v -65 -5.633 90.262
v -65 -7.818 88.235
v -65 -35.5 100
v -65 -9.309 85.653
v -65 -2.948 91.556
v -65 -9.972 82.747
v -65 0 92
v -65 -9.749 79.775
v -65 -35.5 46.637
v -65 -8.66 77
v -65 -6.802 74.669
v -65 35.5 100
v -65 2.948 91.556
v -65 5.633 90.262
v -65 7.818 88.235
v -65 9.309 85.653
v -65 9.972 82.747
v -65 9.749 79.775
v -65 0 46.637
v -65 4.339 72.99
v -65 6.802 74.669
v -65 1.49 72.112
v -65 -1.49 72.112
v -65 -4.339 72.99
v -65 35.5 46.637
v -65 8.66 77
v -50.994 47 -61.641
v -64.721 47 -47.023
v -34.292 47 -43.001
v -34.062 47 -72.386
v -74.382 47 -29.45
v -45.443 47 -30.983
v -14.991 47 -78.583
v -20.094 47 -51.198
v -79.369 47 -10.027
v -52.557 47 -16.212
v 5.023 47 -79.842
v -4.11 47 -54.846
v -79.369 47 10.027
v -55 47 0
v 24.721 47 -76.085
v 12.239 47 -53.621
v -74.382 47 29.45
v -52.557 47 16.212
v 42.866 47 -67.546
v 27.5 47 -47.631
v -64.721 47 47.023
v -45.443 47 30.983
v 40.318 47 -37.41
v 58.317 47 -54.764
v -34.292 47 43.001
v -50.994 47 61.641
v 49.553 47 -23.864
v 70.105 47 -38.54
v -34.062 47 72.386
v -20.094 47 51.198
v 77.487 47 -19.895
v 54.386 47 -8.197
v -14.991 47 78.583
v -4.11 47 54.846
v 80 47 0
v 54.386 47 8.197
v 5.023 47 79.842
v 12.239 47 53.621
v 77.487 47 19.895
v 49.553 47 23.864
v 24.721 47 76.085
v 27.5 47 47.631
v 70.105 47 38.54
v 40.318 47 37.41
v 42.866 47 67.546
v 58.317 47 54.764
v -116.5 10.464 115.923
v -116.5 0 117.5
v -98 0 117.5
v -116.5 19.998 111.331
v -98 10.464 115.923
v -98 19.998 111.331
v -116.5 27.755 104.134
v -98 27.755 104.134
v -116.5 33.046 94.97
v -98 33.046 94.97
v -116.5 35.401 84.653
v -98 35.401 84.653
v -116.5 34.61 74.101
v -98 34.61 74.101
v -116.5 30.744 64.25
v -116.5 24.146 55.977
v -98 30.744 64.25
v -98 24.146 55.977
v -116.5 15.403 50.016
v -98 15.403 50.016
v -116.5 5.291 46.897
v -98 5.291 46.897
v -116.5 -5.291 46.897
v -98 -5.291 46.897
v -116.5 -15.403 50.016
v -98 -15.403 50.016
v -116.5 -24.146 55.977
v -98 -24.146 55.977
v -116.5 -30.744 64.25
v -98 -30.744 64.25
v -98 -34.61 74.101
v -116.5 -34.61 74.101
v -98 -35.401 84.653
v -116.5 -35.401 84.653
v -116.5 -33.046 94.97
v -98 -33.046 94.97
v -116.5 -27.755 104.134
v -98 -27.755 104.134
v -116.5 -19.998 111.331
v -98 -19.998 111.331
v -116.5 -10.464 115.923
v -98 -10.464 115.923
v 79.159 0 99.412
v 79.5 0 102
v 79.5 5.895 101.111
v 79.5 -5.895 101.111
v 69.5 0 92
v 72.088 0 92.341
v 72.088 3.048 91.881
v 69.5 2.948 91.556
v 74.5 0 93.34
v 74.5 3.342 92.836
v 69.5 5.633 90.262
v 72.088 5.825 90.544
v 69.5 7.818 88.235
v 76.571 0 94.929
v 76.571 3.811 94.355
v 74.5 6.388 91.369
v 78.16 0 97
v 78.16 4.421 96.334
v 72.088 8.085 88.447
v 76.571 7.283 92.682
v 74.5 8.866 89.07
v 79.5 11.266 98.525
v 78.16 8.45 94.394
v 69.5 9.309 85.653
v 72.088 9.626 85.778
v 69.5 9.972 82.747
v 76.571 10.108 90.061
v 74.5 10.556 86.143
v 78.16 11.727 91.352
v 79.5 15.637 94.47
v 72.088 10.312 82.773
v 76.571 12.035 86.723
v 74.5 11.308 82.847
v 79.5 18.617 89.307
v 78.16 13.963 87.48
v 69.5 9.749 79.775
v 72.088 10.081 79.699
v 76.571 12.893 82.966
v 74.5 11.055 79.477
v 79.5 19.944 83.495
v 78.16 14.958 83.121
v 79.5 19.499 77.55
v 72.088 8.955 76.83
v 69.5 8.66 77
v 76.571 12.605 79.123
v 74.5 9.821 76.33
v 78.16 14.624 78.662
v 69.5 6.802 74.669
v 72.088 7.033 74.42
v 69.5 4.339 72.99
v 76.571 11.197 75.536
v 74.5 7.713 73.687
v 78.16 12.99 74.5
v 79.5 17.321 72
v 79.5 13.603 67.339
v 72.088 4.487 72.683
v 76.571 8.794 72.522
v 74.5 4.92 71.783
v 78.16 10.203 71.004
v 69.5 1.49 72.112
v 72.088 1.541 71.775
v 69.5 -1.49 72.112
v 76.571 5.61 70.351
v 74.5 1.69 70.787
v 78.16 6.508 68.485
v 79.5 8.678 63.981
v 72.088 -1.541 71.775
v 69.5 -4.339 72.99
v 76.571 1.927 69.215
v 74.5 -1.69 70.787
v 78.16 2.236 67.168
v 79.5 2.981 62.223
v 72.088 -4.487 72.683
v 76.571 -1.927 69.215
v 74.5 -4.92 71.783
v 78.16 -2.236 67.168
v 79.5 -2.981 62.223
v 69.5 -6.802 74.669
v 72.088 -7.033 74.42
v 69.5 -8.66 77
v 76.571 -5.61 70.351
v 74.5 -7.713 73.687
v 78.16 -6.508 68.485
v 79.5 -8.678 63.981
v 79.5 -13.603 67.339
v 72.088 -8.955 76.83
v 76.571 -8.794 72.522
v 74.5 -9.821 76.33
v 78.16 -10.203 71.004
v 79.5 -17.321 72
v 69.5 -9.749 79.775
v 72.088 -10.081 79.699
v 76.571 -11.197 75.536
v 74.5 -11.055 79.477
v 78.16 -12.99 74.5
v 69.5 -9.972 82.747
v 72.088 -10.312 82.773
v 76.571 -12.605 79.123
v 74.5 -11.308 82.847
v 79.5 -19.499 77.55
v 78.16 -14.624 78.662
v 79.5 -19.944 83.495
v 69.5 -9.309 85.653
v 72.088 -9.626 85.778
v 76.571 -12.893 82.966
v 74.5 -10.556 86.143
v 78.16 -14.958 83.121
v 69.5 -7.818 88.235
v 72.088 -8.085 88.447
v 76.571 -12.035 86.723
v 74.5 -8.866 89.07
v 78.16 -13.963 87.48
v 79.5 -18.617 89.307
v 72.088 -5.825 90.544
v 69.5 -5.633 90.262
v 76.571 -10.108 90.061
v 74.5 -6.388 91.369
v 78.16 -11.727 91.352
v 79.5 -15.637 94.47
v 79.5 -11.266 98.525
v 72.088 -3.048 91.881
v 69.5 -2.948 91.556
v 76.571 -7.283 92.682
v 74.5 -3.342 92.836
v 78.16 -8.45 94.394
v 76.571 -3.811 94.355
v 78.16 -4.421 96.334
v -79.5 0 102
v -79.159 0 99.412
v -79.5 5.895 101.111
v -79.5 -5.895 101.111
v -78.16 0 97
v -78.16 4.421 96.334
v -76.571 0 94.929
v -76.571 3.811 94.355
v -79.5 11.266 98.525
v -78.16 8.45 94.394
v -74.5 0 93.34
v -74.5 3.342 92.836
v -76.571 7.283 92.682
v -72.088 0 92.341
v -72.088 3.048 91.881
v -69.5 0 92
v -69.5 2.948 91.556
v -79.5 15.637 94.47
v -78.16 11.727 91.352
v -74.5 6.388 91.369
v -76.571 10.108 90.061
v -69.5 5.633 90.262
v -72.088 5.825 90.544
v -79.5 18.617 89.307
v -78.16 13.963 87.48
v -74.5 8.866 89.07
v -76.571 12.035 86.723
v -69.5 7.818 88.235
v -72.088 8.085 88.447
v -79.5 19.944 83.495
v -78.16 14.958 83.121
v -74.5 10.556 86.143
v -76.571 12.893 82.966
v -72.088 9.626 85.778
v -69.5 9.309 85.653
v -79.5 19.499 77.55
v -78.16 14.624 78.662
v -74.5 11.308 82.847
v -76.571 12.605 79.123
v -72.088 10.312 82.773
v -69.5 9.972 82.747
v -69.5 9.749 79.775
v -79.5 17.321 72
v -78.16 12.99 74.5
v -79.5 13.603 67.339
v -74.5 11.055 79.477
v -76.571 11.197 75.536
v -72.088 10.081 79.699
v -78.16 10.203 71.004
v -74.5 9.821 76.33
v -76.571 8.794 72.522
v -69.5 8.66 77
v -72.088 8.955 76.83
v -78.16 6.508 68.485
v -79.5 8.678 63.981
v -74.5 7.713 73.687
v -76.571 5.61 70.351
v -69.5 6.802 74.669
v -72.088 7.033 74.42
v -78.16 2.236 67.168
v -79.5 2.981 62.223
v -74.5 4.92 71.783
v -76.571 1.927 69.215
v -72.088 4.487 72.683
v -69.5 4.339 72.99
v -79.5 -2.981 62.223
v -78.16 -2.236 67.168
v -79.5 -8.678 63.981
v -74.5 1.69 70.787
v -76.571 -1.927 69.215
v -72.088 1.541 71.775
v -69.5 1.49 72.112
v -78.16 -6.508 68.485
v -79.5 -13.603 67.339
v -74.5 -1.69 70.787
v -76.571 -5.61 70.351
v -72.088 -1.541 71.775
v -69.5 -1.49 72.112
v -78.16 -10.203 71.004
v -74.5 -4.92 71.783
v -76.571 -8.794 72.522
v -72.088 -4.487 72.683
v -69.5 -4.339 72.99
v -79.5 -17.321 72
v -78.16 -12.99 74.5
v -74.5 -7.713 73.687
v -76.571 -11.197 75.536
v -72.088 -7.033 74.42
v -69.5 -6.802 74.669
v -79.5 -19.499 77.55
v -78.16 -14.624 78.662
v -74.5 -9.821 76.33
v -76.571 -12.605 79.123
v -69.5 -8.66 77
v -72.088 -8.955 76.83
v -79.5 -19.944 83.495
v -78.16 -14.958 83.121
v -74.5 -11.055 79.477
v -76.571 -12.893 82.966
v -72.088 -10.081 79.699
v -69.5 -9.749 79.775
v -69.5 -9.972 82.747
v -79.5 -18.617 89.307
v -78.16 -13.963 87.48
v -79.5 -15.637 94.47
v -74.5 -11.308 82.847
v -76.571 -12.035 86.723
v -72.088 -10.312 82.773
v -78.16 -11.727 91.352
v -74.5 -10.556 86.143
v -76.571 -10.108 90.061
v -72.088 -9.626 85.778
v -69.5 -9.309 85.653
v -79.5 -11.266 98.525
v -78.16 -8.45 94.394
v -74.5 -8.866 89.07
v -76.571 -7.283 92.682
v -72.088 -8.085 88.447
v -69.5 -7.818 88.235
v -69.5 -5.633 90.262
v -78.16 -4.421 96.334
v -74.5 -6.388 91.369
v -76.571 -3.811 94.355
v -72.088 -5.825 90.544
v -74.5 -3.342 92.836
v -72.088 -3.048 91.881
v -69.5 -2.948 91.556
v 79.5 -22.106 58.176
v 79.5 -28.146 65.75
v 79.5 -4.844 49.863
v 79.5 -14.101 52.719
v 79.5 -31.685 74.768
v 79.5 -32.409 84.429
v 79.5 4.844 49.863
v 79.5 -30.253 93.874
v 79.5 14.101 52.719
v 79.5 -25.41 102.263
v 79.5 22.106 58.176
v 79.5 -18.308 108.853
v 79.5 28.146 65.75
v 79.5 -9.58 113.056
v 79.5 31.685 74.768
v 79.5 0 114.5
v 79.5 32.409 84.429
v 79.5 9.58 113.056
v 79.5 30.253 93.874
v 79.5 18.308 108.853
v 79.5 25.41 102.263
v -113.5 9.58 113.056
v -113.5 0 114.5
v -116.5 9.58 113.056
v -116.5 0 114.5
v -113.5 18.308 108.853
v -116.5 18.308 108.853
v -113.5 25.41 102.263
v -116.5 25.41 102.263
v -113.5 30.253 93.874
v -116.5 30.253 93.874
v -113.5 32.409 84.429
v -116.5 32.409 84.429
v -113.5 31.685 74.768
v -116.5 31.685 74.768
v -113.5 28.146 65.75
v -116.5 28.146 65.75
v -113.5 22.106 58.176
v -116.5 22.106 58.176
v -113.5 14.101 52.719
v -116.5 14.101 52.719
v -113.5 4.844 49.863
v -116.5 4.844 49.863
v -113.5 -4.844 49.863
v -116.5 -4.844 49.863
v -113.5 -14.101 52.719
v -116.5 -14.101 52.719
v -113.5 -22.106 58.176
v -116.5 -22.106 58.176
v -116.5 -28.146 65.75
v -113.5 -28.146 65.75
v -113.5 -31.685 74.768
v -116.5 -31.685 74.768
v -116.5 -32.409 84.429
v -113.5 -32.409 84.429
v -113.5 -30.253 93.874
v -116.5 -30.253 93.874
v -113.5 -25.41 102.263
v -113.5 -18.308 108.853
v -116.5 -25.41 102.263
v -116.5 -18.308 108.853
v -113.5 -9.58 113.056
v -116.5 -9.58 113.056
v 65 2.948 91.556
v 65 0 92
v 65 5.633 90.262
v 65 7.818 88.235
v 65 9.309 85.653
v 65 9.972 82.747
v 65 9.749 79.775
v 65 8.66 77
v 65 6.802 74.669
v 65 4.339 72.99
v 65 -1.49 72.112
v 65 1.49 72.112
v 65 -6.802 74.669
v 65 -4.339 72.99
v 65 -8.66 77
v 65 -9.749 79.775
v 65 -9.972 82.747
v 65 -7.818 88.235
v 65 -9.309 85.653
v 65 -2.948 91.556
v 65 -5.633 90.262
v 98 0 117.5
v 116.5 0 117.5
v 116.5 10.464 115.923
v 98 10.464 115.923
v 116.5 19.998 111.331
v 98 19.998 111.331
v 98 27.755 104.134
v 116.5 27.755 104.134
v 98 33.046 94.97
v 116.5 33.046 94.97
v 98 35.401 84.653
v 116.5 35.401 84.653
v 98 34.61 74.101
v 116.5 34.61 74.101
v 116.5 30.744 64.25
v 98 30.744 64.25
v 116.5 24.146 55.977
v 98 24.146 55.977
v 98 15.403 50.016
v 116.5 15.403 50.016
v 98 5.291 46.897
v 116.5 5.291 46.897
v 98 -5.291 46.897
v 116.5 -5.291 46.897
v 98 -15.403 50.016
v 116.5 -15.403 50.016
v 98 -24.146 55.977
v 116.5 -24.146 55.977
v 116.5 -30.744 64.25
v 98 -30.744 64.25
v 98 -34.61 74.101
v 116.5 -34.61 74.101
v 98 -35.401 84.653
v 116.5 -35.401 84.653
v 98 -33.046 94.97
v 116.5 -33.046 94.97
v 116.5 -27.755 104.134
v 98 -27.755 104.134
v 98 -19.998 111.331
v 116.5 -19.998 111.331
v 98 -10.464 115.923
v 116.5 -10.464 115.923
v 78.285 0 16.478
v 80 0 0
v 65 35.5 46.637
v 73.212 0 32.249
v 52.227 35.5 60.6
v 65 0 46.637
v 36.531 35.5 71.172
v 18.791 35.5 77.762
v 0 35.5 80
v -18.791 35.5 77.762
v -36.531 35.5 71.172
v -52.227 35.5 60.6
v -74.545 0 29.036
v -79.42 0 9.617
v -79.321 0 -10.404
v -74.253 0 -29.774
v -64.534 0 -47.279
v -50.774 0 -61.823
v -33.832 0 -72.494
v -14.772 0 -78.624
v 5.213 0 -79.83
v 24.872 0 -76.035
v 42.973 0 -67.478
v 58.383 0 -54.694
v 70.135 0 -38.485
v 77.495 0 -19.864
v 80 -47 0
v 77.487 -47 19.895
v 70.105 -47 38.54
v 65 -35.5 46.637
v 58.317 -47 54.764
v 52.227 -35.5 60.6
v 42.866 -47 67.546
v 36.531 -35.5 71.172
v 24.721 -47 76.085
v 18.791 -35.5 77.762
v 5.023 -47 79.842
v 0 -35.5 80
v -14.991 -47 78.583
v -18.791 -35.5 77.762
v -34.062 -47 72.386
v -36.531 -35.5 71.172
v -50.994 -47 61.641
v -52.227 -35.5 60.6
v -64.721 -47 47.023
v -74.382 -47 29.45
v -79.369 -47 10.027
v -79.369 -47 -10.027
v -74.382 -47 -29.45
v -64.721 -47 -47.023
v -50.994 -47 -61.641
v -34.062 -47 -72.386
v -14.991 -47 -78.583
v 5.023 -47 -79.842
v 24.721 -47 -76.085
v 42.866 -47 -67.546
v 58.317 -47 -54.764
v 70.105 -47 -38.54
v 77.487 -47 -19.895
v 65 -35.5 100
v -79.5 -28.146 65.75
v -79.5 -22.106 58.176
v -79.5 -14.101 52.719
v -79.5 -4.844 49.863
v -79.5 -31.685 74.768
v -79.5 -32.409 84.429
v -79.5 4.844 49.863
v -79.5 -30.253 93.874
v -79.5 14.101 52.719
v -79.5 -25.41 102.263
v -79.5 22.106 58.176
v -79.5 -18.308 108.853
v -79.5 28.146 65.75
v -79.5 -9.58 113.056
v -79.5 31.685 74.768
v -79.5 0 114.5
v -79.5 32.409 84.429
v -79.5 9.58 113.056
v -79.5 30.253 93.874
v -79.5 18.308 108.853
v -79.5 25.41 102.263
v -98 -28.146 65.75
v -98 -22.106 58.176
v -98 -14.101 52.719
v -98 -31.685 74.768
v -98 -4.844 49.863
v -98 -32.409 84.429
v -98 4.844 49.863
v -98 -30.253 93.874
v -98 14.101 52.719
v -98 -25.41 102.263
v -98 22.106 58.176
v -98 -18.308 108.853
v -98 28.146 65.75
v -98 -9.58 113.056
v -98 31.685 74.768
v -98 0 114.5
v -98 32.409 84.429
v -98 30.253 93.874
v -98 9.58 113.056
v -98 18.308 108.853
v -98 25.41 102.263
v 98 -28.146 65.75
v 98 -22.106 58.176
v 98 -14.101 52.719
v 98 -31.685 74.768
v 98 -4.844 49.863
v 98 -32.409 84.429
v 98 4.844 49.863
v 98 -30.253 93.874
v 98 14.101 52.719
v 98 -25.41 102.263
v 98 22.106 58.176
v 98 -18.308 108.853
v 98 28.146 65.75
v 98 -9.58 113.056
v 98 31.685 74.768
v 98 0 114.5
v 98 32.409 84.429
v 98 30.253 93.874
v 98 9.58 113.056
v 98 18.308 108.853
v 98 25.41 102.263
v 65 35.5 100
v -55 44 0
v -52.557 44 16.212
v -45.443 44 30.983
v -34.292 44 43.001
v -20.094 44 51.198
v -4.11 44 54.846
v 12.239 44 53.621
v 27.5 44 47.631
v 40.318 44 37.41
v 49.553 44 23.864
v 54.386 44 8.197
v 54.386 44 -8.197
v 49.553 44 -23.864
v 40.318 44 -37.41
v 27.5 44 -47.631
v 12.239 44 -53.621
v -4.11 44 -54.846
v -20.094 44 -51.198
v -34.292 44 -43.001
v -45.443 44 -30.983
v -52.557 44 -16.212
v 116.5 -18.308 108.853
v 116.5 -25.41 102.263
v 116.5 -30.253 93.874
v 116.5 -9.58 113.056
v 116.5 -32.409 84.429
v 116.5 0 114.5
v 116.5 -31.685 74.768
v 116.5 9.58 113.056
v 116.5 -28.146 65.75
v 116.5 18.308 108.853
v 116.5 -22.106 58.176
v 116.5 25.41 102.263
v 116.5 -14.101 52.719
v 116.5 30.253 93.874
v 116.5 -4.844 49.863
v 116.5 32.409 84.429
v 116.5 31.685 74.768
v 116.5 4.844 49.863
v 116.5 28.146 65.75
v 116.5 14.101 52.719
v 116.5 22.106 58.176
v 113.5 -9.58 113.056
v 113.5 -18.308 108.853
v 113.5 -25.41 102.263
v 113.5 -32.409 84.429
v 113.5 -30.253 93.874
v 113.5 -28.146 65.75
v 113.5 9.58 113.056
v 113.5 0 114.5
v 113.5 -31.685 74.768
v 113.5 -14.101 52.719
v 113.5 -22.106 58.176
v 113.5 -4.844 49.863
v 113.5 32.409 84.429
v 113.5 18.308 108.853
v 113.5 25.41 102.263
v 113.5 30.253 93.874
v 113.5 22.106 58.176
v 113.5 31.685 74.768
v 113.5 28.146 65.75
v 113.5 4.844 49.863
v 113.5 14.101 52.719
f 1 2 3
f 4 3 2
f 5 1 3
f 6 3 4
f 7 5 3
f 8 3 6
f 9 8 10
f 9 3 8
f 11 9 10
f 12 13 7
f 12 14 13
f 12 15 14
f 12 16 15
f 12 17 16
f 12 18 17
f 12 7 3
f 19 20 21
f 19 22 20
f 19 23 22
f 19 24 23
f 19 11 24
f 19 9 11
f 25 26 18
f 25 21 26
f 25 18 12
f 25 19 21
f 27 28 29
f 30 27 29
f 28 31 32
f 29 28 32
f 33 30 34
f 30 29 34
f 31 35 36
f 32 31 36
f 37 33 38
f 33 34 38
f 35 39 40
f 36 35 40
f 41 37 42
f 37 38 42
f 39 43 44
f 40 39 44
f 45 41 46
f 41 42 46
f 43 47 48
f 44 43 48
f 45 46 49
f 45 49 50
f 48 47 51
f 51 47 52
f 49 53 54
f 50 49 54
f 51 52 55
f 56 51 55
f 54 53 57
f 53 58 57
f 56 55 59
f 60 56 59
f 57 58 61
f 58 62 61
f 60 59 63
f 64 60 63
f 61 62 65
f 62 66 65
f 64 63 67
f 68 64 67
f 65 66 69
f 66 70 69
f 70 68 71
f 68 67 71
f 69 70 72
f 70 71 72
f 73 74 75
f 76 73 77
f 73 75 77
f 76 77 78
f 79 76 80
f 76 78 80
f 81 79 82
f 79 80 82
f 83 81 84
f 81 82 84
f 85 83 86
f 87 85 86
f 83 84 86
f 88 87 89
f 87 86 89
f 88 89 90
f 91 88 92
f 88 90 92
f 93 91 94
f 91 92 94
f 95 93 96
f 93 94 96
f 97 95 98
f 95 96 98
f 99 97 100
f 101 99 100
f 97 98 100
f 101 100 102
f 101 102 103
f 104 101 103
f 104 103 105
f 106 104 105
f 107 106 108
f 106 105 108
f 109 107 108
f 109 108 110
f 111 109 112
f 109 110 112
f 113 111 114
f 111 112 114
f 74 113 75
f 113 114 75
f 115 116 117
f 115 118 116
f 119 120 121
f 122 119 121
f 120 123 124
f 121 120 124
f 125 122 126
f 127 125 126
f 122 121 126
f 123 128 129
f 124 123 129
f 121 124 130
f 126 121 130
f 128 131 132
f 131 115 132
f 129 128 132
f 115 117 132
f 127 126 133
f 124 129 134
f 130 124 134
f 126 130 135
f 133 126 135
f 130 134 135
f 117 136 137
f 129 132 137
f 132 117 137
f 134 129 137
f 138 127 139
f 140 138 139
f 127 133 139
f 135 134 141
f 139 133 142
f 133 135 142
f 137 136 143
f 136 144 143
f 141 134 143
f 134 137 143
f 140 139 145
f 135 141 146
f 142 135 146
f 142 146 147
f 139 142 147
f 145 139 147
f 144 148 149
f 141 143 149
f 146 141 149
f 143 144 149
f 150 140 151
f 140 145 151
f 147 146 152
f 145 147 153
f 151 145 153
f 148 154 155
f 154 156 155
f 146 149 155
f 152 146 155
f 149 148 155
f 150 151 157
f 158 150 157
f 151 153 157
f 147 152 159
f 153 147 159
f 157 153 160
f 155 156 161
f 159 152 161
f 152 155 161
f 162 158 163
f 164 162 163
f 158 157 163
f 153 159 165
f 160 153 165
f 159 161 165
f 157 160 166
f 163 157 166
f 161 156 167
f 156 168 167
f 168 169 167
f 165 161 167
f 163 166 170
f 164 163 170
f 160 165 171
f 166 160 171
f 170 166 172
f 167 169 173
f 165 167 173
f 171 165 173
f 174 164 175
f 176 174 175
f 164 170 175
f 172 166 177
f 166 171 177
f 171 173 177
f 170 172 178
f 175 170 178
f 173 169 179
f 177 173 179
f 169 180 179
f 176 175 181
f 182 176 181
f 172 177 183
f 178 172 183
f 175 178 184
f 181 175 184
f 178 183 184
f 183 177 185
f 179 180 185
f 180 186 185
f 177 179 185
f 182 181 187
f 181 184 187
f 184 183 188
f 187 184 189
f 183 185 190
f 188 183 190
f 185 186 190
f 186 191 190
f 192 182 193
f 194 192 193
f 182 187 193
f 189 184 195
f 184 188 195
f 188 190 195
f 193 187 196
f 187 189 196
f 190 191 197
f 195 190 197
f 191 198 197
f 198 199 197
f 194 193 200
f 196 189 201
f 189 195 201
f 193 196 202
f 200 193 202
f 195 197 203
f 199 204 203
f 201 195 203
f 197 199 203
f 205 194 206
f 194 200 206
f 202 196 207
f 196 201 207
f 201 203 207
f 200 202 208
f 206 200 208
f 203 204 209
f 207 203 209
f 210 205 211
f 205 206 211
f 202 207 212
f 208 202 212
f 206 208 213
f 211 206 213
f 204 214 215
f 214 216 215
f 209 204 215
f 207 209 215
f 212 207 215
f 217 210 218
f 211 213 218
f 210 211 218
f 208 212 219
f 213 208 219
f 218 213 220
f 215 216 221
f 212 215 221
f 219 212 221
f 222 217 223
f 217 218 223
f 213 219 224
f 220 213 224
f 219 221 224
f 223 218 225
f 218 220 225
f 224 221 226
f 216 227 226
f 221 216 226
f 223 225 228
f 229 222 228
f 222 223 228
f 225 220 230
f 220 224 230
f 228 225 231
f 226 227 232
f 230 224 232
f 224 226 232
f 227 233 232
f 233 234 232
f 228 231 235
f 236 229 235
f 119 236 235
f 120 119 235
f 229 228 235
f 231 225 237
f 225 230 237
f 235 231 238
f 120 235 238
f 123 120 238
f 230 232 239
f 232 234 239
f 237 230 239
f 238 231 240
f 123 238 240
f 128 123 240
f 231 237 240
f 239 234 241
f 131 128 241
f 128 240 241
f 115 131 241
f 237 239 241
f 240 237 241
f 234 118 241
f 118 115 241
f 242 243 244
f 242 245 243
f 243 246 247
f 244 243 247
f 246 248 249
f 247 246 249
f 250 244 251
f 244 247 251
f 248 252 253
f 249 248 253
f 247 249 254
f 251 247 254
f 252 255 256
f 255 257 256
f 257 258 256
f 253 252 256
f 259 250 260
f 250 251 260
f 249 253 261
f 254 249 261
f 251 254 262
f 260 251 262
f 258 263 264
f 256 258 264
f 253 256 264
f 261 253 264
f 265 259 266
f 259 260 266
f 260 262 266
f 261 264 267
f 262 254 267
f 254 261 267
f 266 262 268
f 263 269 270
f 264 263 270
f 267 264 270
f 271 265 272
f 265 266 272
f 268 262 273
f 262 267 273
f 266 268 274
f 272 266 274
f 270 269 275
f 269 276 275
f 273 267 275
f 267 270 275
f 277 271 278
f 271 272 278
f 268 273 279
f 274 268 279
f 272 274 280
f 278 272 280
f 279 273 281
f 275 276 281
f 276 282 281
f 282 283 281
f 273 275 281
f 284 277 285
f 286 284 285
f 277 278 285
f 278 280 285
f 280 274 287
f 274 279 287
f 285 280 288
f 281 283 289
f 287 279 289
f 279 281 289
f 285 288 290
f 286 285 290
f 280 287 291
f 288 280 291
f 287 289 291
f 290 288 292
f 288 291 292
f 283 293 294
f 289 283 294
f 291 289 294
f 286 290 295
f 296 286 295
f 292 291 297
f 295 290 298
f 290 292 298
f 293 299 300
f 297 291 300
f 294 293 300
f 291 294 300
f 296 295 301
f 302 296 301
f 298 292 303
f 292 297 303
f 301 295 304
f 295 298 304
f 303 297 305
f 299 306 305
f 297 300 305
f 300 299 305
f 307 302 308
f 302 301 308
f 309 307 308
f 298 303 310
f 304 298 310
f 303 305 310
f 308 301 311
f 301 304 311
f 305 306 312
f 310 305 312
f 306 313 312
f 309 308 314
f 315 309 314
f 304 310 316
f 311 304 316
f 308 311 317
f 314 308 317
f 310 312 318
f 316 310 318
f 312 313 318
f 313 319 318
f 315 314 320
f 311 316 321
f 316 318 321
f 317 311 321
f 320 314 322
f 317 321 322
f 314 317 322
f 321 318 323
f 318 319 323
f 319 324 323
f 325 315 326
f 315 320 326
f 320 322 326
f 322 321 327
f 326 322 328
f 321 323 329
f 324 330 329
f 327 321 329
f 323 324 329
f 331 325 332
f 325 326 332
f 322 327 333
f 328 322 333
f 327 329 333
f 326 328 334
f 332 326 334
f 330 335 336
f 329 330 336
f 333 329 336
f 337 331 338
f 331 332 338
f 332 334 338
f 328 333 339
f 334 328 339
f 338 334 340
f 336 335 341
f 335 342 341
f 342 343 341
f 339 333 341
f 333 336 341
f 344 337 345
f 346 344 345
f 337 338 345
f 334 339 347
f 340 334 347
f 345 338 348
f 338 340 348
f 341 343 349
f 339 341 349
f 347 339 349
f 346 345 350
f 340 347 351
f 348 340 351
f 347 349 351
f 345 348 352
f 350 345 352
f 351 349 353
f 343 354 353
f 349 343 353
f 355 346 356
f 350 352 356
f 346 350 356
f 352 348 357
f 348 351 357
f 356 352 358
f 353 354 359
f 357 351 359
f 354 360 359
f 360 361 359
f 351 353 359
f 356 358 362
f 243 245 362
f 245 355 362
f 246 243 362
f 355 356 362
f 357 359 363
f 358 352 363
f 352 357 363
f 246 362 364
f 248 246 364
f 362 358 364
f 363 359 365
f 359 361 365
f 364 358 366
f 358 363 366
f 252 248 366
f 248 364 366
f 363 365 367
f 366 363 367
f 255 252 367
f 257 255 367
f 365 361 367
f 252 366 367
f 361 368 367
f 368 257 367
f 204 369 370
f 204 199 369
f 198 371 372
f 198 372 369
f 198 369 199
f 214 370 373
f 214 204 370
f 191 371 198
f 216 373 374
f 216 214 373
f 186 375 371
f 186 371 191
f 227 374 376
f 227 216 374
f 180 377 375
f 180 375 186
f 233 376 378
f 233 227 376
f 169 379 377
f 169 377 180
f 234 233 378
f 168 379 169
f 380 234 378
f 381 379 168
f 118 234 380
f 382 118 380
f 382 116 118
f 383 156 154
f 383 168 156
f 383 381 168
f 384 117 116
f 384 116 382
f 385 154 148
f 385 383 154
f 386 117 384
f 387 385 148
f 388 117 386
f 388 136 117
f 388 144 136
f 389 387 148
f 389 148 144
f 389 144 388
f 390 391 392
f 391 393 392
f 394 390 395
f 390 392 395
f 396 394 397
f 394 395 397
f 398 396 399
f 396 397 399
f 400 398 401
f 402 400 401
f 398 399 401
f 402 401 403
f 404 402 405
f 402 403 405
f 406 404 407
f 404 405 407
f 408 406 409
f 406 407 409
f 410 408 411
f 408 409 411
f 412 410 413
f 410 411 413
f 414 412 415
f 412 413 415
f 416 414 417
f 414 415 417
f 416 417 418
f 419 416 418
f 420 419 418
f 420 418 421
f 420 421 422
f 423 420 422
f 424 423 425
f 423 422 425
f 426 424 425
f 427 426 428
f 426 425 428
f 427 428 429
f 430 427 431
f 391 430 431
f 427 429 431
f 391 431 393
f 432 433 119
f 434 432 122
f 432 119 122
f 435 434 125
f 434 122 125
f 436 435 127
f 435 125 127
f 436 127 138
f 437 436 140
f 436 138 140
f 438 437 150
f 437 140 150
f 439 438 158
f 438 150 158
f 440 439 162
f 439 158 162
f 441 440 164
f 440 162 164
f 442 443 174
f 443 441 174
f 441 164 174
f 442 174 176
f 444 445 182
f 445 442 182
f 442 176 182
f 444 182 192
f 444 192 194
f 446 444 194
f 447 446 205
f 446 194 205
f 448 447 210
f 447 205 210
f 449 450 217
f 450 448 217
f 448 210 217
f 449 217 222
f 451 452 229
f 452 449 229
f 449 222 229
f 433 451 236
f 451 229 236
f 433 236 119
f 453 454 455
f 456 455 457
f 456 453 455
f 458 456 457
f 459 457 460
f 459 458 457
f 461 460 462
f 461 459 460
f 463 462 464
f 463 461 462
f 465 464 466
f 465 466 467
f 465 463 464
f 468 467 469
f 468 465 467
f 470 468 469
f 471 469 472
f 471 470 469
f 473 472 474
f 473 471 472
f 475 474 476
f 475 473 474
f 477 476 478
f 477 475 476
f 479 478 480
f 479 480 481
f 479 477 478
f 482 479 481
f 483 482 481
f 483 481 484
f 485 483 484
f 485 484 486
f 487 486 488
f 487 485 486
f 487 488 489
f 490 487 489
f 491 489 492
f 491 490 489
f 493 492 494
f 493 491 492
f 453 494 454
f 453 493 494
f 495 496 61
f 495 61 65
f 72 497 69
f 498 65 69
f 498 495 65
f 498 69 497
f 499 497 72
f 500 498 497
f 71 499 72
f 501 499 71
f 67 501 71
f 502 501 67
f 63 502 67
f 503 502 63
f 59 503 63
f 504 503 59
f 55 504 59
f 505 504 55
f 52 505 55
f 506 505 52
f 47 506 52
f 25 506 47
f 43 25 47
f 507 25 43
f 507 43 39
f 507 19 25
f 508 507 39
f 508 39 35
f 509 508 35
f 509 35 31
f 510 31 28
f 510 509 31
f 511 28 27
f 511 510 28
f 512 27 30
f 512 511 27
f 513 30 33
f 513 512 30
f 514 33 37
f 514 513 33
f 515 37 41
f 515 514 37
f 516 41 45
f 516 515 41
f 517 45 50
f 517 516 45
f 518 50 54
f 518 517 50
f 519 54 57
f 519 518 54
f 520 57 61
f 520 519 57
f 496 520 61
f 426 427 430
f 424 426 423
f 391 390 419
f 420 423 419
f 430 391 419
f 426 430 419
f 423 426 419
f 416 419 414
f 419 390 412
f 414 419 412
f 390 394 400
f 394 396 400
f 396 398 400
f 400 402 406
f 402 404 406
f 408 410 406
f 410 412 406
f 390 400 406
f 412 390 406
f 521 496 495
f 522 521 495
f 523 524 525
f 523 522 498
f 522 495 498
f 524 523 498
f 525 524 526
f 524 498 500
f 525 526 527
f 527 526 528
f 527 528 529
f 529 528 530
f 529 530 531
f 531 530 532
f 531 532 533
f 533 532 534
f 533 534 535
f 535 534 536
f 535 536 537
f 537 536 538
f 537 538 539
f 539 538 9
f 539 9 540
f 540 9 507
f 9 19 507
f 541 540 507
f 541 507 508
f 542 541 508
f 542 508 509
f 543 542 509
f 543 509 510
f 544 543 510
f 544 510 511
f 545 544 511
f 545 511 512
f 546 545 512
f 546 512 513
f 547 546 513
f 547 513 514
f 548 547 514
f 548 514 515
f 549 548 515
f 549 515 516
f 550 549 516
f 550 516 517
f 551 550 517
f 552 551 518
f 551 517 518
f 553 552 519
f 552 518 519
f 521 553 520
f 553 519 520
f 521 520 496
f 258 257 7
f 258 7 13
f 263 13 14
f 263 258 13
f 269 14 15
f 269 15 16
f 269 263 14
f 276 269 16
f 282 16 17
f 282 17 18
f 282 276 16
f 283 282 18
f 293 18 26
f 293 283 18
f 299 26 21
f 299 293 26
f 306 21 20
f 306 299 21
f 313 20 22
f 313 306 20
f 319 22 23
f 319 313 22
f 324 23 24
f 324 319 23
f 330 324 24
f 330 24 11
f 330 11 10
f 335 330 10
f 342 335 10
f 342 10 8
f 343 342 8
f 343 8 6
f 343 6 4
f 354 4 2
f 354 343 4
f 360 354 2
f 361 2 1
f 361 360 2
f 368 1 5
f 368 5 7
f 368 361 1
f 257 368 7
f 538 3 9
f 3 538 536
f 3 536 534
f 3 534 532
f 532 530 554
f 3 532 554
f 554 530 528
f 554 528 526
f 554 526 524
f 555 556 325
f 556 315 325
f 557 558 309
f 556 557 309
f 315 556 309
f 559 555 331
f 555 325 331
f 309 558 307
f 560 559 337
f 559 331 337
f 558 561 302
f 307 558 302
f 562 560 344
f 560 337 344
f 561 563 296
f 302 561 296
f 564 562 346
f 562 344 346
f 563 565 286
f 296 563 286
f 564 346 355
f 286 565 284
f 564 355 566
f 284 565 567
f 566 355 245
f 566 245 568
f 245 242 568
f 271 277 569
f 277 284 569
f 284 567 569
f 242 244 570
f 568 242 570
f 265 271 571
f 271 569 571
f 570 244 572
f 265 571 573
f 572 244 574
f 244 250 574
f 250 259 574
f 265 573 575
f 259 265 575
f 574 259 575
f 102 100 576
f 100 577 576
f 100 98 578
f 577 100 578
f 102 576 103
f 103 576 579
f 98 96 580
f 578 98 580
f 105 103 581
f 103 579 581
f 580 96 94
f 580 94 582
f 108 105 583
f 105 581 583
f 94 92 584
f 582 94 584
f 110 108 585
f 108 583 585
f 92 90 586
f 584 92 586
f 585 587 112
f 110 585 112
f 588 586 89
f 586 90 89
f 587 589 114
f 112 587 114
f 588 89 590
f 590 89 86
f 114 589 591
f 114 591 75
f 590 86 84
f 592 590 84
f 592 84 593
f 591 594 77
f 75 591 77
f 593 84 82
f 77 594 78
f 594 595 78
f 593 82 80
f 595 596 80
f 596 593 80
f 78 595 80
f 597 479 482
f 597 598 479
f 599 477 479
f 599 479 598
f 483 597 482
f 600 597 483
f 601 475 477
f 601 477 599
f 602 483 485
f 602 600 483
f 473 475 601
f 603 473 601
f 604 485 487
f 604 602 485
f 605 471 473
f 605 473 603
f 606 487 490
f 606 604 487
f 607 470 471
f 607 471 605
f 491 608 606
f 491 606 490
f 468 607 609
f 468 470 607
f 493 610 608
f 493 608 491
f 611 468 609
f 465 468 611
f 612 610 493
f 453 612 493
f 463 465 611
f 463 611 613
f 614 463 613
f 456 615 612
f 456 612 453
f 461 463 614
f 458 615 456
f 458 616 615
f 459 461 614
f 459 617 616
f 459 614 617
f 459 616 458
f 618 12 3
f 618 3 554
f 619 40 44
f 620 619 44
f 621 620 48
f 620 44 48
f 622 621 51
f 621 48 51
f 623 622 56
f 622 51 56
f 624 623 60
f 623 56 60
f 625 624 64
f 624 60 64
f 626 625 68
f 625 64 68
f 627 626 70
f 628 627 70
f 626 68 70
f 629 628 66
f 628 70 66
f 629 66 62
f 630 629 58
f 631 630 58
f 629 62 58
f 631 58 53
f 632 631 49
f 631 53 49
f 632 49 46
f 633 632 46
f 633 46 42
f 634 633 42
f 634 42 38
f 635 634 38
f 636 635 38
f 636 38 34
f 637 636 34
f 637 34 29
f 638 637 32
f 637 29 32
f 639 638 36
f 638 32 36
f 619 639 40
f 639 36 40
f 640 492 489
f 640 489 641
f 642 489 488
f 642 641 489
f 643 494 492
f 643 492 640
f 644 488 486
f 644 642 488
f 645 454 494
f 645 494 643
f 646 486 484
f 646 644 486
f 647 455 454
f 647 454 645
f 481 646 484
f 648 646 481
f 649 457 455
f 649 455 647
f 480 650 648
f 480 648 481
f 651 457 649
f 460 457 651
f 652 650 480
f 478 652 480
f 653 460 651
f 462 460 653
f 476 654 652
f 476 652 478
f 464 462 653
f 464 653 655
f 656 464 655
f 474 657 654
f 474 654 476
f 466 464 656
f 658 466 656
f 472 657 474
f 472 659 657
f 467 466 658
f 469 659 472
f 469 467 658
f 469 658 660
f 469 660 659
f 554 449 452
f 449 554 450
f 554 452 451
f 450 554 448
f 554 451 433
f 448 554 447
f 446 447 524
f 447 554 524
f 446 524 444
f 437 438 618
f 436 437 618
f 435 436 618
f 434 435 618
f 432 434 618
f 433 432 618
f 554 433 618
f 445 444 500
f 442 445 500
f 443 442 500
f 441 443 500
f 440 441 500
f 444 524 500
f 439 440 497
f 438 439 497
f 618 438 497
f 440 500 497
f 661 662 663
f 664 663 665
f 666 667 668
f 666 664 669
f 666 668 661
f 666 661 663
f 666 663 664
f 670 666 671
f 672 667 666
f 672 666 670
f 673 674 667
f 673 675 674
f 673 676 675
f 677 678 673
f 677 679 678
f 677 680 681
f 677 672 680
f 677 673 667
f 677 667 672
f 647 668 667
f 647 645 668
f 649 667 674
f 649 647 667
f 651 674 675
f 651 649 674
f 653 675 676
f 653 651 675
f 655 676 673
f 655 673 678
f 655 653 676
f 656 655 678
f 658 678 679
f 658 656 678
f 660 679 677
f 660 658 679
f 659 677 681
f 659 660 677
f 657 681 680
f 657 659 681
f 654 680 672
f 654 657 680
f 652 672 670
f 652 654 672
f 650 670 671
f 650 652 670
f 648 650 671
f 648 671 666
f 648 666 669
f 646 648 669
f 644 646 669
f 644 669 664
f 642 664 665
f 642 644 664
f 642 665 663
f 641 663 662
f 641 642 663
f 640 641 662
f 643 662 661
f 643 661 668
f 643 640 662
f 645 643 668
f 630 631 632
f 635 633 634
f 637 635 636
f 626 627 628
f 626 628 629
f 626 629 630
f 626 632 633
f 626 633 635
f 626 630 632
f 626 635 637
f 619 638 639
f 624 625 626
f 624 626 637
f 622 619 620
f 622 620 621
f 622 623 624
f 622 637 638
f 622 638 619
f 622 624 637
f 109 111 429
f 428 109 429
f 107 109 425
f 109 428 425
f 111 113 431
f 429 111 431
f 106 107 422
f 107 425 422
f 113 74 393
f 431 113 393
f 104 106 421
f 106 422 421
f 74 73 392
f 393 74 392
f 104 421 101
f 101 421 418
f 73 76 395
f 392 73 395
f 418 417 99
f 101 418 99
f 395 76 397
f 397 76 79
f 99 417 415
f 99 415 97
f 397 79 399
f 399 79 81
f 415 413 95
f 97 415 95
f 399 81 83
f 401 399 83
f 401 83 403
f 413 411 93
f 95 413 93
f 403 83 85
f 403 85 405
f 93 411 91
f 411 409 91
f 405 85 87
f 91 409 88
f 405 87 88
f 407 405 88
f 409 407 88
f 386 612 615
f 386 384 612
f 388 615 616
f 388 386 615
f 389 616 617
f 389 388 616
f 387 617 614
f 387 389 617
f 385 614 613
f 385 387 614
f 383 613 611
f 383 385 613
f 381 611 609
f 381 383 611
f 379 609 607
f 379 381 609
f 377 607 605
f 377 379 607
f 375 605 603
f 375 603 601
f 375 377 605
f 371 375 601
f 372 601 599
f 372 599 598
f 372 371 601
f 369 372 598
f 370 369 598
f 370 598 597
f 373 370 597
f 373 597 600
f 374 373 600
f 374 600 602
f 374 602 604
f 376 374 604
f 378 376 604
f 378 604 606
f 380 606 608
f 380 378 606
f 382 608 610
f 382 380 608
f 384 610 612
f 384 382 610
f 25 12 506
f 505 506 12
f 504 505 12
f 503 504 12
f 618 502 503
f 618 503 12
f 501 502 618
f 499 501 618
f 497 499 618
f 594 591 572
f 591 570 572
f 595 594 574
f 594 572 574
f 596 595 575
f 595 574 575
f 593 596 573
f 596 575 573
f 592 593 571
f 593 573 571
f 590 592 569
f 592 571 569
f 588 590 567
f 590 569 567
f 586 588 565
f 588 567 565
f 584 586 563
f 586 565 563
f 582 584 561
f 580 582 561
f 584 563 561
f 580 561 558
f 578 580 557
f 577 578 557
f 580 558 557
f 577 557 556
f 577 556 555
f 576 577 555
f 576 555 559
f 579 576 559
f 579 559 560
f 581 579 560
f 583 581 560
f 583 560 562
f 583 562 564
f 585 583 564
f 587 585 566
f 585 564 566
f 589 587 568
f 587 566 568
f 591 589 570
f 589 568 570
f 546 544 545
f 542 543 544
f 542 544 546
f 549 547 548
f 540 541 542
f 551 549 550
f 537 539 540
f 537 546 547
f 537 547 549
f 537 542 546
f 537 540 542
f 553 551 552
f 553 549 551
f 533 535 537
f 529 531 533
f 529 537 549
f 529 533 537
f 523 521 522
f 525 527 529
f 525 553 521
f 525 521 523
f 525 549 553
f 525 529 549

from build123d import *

# Parameters (mm, degrees)
F0_R      = 80
F1_DEPTH  = 47
F2_W      = 130
F2_H      = 71
F3_DEPTH  = 100
F4_W      = 79.5
F4_H      = 10
F6_R      = 10
F7_R      = 80
F8_DEPTH  = 47
F9_R      = 55
F10_DEPTH = 3


# Not quite as in the source:
# - a pattern or mirror of a feature is missing from the dataset's text; its kind, count and spacing are read off the source's solid


with BuildPart() as f1:
    # F0 (on Front) → F1 (new body)
    with BuildSketch(Plane.XZ):
        Circle(F0_R)
    extrude(amount=F1_DEPTH)

    # F2 (on Top) → F3 (join)
    with BuildSketch(Plane.XY):
        Rectangle(F2_W, F2_H)
    extrude(amount=F3_DEPTH)

    # F4 (on Front) → F5 (revolve)
    with BuildSketch(Plane.XZ):
        Polygon((79.5, 114.5), (79.5, 92), (79.5, 82), (113.5, 82), (113.5, 114.5), (116.5, 114.5), (116.5, 117.5), (98, 117.5), (98, 114.5), align=None)
        with Locations((39.75, 87)):
            Rectangle(F4_W, F4_H)
    f5 = revolve(axis=Axis((96.5, 0, 82), (-1, 0, 0)))

    # F5_copies: F5 across plane
    add(f5.mirror(Plane(origin=(0, 0, 0), x_dir=(0, 0, -1), z_dir=(-1, 0, 0))))

    # F6
    f6_edges = [f1.edges().sort_by_distance(p)[0] for p in [
        (79.5, 0, 72),
        (-79.5, 0, 72),
    ]]
    fillet(f6_edges, radius=F6_R)

    # F7 (on Front) → F8 (join)
    with BuildSketch(Plane.XZ):
        Circle(F7_R)
    extrude(amount=-F8_DEPTH)

    # F9 (on face) → F10 (cut)
    with BuildSketch(Plane(origin=(0, 47, 0), x_dir=(-1, 0, 0), z_dir=(0, 1, 0))):
        Circle(F9_R)
    extrude(amount=-F10_DEPTH, mode=Mode.SUBTRACT)


solid = f1.part
